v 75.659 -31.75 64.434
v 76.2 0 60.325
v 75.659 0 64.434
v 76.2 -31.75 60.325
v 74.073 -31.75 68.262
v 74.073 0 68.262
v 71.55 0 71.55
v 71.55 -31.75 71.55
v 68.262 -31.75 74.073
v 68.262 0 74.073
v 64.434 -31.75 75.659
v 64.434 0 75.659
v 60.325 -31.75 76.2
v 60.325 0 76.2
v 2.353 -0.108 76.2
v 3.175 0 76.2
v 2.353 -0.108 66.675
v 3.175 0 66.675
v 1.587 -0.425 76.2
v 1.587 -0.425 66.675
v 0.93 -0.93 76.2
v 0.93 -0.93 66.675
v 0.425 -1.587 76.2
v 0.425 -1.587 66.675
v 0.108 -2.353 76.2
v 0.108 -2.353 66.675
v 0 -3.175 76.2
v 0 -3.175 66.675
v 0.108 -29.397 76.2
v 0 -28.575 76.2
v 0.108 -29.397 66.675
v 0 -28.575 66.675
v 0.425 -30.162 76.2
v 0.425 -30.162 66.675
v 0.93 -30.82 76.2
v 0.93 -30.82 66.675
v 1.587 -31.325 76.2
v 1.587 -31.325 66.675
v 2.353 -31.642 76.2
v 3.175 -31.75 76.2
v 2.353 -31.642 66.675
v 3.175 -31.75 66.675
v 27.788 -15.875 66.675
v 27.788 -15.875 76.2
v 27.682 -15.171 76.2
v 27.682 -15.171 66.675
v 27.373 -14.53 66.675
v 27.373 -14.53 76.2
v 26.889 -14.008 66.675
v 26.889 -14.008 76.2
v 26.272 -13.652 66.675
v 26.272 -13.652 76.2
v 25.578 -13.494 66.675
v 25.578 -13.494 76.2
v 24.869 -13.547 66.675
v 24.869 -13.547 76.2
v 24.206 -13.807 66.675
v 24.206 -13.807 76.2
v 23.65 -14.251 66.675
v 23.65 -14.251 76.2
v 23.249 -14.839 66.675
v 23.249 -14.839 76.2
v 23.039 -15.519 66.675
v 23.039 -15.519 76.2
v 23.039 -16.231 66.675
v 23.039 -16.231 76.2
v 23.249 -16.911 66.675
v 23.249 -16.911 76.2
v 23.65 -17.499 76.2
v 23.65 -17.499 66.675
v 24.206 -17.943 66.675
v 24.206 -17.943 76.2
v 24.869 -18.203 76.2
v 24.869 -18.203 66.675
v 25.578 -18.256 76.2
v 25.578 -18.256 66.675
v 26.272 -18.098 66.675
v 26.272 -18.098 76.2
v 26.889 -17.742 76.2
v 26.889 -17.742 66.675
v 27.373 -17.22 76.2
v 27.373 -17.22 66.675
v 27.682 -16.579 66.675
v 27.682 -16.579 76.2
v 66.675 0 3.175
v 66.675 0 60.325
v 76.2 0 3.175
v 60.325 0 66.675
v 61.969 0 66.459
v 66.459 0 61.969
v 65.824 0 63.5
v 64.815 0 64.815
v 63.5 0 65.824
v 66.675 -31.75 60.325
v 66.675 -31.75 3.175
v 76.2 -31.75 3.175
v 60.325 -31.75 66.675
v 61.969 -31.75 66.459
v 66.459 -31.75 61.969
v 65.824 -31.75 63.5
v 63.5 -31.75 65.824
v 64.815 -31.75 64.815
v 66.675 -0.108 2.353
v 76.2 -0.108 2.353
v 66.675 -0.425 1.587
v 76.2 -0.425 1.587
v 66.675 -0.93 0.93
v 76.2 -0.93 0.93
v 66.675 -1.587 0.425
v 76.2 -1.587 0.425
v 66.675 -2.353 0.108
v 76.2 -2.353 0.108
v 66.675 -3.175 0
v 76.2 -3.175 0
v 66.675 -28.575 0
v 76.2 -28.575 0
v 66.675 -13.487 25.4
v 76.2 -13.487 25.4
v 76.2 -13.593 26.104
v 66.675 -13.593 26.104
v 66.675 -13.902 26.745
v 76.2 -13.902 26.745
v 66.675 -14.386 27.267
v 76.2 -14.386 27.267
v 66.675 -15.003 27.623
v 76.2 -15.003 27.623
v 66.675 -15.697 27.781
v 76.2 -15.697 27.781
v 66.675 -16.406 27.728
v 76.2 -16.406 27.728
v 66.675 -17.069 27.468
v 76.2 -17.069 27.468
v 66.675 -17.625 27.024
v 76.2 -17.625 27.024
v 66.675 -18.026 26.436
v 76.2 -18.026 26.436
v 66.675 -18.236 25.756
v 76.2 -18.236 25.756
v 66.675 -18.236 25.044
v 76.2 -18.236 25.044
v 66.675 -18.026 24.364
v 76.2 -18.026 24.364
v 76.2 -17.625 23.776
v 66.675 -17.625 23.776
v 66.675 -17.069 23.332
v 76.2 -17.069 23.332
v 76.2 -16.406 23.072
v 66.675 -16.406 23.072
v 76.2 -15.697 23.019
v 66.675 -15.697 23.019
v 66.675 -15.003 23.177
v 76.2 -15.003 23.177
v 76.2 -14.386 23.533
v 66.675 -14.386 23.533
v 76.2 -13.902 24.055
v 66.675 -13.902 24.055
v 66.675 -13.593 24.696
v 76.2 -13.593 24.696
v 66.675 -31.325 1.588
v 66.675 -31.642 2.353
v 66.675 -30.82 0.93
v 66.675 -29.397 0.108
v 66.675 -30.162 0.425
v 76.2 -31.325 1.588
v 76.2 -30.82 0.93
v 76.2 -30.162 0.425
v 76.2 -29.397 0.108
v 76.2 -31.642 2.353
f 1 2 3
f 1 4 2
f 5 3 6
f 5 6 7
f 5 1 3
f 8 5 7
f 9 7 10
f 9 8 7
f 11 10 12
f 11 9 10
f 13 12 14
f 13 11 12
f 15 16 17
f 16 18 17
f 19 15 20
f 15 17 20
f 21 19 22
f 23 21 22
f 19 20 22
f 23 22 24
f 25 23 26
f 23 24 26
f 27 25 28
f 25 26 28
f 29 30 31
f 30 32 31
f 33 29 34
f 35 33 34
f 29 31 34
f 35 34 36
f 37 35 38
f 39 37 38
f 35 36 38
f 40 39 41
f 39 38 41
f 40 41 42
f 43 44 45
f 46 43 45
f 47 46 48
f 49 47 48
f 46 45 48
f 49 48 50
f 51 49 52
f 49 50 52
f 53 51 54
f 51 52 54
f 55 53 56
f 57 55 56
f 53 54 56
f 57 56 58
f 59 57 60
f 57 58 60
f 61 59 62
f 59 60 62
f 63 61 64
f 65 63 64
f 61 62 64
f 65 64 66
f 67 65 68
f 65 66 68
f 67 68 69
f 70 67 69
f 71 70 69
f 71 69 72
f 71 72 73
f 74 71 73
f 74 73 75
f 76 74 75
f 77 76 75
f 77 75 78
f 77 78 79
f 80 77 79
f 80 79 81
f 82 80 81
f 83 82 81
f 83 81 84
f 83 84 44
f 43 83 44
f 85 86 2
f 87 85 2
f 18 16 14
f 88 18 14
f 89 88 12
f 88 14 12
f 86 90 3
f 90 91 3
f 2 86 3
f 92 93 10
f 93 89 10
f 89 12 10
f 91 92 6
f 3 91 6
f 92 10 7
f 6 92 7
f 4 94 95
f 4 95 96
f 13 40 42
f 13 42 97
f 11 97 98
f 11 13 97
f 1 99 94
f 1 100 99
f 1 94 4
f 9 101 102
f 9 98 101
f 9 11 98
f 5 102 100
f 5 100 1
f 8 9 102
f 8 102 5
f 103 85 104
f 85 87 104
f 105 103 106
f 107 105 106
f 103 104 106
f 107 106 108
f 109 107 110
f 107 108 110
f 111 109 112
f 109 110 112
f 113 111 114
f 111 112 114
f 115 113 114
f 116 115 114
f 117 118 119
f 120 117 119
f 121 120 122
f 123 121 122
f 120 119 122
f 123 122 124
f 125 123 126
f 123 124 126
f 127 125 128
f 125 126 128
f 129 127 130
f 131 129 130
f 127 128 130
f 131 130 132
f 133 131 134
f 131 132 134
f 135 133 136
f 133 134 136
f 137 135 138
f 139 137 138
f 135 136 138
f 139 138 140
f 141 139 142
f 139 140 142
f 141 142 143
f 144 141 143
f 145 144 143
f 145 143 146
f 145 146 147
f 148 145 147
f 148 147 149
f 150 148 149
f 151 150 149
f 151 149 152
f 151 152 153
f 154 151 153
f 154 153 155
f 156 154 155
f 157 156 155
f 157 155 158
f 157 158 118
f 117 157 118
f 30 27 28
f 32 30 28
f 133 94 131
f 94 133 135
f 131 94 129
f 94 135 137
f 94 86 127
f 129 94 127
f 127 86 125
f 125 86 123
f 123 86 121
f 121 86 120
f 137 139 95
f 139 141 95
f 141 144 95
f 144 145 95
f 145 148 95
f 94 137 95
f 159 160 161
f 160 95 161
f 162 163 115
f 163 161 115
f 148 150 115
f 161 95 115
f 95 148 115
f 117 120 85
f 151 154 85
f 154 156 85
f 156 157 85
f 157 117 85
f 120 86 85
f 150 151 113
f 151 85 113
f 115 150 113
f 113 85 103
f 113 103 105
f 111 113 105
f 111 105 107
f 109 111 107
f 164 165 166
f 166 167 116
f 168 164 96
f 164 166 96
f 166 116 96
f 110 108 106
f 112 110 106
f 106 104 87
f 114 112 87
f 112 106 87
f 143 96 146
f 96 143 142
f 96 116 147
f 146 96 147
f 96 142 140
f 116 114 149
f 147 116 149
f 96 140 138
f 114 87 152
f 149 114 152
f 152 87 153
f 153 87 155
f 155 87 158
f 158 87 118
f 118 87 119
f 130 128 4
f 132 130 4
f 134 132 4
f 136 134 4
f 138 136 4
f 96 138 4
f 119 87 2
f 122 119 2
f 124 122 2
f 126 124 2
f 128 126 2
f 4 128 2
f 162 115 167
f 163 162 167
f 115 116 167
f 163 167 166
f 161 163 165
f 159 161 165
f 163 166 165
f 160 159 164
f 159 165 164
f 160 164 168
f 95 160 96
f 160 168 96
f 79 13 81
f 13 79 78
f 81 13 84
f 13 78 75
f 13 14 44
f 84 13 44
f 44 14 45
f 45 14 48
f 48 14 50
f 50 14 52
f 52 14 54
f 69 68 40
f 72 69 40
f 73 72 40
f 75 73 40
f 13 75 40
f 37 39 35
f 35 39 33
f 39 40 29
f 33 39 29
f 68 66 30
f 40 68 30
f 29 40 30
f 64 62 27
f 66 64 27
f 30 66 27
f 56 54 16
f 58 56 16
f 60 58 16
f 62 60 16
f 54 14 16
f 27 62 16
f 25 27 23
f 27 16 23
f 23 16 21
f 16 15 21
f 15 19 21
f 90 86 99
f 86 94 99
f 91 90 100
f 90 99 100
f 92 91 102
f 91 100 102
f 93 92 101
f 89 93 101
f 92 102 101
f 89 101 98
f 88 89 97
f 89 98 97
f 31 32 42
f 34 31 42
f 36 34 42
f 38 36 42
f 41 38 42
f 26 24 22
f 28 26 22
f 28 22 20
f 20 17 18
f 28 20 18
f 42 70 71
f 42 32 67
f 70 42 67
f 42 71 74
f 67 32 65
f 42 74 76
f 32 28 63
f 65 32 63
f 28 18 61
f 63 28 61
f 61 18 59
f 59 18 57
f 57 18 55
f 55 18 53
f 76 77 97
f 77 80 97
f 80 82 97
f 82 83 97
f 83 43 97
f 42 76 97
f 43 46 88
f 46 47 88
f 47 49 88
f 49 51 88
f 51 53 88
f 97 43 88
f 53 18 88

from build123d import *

# Parameters (mm, degrees)
F1_DEPTH = 31.75
F2_R     = 2.3876
F3_DEPTH = 25.4
F4_R     = 2.3876
F5_DEPTH = 25.4
F6_R     = 15.875
F7_R     = 6.35
F8_R     = 3.175


with BuildPart() as f1:
    # F0 (on Front) → F1 (new body)
    with BuildSketch(Plane.XZ):
        Polygon((66.675, 66.675), (66.675, 0), (76.2, 0), (76.2, 76.2), (0, 76.2), (0, 66.675), align=None)
    extrude(amount=F1_DEPTH)

    # F2 (on face) → F3 (cut)
    with BuildSketch(Plane.YZ.offset(76.2)):
        with Locations((-15.875, 25.4)):
            Circle(F2_R)
    extrude(amount=-F3_DEPTH, mode=Mode.SUBTRACT)

    # F4 (on face) → F5 (cut)
    with BuildSketch(Plane.XY.offset(76.2)):
        with Locations((25.4, -15.875)):
            Circle(F4_R)
    extrude(amount=-F5_DEPTH, mode=Mode.SUBTRACT)

    # F6
    f6_edges = [f1.edges().sort_by_distance(p)[0] for p in [
        (76.2, -15.875, 76.2),
    ]]
    fillet(f6_edges, radius=F6_R)

    # F7
    f7_edges = [f1.edges().sort_by_distance(p)[0] for p in [
        (66.675, -15.875, 66.675),
    ]]
    fillet(f7_edges, radius=F7_R)

    # F8
    f8_edges = [f1.edges().sort_by_distance(p)[0] for p in [
        (0, 0, 71.4375),
        (0, -31.75, 71.4375),
        (71.4375, 0, 0),
        (71.4375, -31.75, 0),
    ]]
    fillet(f8_edges, radius=F8_R)


solid = f1.part
